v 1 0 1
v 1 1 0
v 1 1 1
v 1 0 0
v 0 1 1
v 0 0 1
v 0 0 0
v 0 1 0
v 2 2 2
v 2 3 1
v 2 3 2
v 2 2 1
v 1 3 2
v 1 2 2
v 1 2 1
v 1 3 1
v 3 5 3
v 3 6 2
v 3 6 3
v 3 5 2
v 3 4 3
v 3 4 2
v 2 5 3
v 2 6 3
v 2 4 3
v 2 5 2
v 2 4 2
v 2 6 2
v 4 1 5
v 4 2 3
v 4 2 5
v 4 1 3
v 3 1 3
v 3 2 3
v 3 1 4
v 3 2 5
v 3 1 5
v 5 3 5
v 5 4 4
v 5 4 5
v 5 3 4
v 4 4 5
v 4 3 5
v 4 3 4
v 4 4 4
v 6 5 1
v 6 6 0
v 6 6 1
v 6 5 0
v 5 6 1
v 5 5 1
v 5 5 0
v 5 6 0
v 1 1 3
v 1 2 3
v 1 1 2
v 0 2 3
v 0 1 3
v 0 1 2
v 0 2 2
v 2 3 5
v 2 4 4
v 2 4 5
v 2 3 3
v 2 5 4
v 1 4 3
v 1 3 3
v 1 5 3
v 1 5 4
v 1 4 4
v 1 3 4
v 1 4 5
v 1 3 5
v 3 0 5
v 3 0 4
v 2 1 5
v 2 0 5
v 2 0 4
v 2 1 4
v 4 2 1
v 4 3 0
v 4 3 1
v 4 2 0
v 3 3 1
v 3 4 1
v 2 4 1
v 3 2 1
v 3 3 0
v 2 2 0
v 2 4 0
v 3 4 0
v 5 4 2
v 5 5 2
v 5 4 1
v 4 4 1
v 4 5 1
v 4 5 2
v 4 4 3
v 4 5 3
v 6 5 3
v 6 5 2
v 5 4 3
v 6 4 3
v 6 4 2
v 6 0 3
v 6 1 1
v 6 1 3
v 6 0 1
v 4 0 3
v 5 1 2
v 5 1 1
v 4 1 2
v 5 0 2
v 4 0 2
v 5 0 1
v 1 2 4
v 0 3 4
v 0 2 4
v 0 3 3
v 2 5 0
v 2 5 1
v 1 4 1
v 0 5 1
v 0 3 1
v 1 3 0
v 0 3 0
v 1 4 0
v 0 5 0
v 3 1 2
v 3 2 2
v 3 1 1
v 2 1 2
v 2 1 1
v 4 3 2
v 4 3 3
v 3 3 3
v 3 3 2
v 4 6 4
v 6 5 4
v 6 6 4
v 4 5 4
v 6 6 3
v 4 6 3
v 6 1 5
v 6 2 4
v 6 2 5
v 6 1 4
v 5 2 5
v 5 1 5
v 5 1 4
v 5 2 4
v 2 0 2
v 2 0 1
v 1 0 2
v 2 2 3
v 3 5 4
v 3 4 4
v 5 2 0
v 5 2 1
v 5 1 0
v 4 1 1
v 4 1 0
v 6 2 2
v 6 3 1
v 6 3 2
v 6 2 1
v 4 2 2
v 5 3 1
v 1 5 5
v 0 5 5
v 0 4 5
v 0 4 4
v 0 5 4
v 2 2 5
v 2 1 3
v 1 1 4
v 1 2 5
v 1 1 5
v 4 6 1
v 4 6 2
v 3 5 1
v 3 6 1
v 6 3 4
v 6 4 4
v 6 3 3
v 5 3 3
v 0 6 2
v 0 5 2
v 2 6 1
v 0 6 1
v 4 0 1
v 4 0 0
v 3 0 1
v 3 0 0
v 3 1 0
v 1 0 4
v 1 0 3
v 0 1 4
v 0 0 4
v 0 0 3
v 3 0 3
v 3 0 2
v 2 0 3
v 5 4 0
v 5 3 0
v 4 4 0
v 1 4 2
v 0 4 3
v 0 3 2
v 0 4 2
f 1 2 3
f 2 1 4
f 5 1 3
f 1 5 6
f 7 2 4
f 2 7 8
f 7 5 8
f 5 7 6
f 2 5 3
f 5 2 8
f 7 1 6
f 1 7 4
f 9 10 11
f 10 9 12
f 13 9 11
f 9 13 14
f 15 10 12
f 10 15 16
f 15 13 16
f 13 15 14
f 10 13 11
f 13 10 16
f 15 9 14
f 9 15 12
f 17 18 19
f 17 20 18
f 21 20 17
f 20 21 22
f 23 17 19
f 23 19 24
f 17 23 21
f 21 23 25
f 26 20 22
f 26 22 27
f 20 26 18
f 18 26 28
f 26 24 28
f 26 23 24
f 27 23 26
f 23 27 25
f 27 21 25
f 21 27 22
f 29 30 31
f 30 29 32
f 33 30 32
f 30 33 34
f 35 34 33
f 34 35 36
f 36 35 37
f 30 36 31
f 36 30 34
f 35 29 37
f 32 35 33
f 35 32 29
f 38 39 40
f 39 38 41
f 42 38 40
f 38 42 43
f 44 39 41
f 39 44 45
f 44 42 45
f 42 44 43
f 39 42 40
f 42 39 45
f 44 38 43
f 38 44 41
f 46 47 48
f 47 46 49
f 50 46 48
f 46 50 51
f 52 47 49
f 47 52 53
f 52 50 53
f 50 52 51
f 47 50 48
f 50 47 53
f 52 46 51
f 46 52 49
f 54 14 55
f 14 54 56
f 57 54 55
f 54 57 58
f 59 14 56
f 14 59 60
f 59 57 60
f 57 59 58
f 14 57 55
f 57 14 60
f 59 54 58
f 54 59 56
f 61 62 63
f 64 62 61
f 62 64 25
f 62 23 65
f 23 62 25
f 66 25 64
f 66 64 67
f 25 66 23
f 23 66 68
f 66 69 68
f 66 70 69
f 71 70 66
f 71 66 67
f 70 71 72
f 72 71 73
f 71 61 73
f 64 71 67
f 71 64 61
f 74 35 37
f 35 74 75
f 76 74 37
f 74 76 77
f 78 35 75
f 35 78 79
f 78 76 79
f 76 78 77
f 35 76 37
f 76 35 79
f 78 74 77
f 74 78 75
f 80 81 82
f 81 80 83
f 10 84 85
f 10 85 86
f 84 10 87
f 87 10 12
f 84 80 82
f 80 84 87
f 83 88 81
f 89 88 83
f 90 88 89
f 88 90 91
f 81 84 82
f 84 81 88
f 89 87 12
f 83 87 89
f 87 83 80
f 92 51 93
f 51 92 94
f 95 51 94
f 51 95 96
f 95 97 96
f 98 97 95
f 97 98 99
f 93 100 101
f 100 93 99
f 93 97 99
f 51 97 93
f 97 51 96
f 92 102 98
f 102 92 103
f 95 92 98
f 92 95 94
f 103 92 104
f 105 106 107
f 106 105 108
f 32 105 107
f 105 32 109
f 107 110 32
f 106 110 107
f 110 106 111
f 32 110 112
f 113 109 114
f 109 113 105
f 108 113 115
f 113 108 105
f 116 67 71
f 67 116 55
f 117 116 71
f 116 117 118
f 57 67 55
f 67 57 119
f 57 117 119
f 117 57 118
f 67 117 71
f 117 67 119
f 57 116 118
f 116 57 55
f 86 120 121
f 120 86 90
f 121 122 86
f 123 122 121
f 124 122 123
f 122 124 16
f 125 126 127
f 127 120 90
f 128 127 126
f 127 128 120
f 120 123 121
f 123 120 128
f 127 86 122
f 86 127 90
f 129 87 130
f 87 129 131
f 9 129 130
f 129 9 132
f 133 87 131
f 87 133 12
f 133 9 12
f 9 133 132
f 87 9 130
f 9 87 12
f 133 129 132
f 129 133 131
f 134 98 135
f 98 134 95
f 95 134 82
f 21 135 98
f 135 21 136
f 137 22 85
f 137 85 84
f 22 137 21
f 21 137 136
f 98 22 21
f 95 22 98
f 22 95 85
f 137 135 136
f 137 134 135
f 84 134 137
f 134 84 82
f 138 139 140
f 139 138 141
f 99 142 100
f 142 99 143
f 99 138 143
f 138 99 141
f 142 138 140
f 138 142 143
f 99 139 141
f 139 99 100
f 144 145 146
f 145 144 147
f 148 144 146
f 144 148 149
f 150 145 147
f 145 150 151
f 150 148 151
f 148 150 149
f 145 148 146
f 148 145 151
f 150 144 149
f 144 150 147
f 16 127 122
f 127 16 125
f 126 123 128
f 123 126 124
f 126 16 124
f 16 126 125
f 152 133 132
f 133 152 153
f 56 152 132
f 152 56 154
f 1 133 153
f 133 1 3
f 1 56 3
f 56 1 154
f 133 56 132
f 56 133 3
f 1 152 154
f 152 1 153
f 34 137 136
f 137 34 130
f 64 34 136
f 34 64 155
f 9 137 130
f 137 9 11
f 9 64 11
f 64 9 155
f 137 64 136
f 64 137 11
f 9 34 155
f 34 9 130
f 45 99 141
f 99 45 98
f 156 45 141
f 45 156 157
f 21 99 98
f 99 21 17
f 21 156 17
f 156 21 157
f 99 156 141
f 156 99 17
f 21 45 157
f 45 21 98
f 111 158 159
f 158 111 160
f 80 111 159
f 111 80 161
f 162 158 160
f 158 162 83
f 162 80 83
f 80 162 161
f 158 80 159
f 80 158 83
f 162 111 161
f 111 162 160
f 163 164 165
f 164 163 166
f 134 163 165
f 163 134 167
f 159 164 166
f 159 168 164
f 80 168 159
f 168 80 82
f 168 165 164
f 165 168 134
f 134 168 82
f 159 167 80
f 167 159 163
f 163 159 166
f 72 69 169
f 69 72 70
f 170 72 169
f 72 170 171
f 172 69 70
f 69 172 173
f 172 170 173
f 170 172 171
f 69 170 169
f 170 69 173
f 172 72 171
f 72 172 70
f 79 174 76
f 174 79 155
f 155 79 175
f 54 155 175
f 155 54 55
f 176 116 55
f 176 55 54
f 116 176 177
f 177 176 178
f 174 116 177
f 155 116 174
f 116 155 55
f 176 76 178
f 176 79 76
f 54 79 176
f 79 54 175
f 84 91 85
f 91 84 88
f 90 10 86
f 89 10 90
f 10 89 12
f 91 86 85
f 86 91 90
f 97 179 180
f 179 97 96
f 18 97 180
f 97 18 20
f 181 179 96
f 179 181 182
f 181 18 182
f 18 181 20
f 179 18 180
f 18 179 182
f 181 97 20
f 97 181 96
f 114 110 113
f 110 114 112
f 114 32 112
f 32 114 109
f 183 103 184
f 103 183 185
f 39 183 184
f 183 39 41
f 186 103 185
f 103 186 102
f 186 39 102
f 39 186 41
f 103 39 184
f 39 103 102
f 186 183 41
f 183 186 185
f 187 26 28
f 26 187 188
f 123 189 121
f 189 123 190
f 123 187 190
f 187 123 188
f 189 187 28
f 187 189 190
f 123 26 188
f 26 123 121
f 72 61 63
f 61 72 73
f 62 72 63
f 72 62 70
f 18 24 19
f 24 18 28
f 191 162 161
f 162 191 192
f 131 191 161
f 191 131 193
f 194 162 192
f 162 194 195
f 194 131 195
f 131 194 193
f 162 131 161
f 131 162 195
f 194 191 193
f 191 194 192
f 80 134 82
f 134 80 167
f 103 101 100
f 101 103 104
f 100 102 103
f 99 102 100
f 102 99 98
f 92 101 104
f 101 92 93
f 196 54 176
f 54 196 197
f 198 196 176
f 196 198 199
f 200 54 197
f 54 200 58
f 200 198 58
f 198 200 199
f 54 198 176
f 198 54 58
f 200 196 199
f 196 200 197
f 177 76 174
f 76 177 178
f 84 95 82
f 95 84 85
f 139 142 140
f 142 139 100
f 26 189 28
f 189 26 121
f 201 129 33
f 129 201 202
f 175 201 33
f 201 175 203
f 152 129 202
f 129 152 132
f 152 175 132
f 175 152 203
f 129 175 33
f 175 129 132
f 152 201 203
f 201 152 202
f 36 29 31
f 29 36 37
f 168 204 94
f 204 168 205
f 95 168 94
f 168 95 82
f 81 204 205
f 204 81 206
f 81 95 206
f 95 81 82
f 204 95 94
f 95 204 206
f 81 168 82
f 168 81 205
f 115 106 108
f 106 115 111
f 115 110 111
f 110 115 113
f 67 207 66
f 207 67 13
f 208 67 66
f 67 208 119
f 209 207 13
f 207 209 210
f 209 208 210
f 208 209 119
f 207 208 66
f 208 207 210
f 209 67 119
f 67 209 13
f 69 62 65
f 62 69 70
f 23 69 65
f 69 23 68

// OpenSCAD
union() {
    translate([0, 0, 0]) cube([1, 1, 1]);
    translate([1, 2, 1]) cube([1, 1, 1]);
    translate([2, 4, 2]) cube([1, 1, 1]);
    translate([3, 1, 3]) cube([1, 1, 1]);
    translate([4, 3, 4]) cube([1, 1, 1]);
    translate([5, 5, 0]) cube([1, 1, 1]);
    translate([0, 1, 2]) cube([1, 1, 1]);
    translate([1, 3, 3]) cube([1, 1, 1]);
    translate([2, 0, 4]) cube([1, 1, 1]);
    translate([3, 2, 0]) cube([1, 1, 1]);
    translate([4, 4, 1]) cube([1, 1, 1]);
    translate([5, 0, 2]) cube([1, 1, 1]);
    translate([0, 2, 3]) cube([1, 1, 1]);
    translate([1, 4, 0]) cube([1, 1, 1]);
    translate([2, 1, 1]) cube([1, 1, 1]);
    translate([3, 3, 2]) cube([1, 1, 1]);
    translate([4, 5, 3]) cube([1, 1, 1]);
    translate([5, 1, 4]) cube([1, 1, 1]);
    translate([0, 3, 0]) cube([1, 1, 1]);
    translate([1, 0, 1]) cube([1, 1, 1]);
    translate([2, 2, 2]) cube([1, 1, 1]);
    translate([3, 4, 3]) cube([1, 1, 1]);
    translate([4, 1, 0]) cube([1, 1, 1]);
    translate([5, 2, 1]) cube([1, 1, 1]);
    translate([0, 4, 4]) cube([1, 1, 1]);
    translate([1, 1, 3]) cube([1, 1, 1]);
    translate([2, 3, 0]) cube([1, 1, 1]);
    translate([3, 5, 1]) cube([1, 1, 1]);
    translate([4, 0, 2]) cube([1, 1, 1]);
    translate([5, 3, 3]) cube([1, 1, 1]);
    translate([0, 5, 1]) cube([1, 1, 1]);
    translate([1, 3, 4]) cube([1, 1, 1]);
    translate([2, 5, 2]) cube([1, 1, 1]);
    translate([3, 0, 0]) cube([1, 1, 1]);
    translate([4, 2, 1]) cube([1, 1, 1]);
    translate([5, 4, 2]) cube([1, 1, 1]);
    translate([0, 0, 3]) cube([1, 1, 1]);
    translate([1, 1, 4]) cube([1, 1, 1]);
    translate([2, 2, 0]) cube([1, 1, 1]);
    translate([3, 3, 1]) cube([1, 1, 1]);
    translate([4, 4, 2]) cube([1, 1, 1]);
    translate([5, 5, 3]) cube([1, 1, 1]);
    translate([0, 4, 0]) cube([1, 1, 1]);
    translate([1, 5, 1]) cube([1, 1, 1]);
    translate([2, 0, 2]) cube([1, 1, 1]);
    translate([3, 1, 4]) cube([1, 1, 1]);
    translate([4, 3, 0]) cube([1, 1, 1]);
    translate([5, 0, 1]) cube([1, 1, 1]);
    translate([0, 3, 2]) cube([1, 1, 1]);
    translate([1, 4, 3]) cube([1, 1, 1]);
}
